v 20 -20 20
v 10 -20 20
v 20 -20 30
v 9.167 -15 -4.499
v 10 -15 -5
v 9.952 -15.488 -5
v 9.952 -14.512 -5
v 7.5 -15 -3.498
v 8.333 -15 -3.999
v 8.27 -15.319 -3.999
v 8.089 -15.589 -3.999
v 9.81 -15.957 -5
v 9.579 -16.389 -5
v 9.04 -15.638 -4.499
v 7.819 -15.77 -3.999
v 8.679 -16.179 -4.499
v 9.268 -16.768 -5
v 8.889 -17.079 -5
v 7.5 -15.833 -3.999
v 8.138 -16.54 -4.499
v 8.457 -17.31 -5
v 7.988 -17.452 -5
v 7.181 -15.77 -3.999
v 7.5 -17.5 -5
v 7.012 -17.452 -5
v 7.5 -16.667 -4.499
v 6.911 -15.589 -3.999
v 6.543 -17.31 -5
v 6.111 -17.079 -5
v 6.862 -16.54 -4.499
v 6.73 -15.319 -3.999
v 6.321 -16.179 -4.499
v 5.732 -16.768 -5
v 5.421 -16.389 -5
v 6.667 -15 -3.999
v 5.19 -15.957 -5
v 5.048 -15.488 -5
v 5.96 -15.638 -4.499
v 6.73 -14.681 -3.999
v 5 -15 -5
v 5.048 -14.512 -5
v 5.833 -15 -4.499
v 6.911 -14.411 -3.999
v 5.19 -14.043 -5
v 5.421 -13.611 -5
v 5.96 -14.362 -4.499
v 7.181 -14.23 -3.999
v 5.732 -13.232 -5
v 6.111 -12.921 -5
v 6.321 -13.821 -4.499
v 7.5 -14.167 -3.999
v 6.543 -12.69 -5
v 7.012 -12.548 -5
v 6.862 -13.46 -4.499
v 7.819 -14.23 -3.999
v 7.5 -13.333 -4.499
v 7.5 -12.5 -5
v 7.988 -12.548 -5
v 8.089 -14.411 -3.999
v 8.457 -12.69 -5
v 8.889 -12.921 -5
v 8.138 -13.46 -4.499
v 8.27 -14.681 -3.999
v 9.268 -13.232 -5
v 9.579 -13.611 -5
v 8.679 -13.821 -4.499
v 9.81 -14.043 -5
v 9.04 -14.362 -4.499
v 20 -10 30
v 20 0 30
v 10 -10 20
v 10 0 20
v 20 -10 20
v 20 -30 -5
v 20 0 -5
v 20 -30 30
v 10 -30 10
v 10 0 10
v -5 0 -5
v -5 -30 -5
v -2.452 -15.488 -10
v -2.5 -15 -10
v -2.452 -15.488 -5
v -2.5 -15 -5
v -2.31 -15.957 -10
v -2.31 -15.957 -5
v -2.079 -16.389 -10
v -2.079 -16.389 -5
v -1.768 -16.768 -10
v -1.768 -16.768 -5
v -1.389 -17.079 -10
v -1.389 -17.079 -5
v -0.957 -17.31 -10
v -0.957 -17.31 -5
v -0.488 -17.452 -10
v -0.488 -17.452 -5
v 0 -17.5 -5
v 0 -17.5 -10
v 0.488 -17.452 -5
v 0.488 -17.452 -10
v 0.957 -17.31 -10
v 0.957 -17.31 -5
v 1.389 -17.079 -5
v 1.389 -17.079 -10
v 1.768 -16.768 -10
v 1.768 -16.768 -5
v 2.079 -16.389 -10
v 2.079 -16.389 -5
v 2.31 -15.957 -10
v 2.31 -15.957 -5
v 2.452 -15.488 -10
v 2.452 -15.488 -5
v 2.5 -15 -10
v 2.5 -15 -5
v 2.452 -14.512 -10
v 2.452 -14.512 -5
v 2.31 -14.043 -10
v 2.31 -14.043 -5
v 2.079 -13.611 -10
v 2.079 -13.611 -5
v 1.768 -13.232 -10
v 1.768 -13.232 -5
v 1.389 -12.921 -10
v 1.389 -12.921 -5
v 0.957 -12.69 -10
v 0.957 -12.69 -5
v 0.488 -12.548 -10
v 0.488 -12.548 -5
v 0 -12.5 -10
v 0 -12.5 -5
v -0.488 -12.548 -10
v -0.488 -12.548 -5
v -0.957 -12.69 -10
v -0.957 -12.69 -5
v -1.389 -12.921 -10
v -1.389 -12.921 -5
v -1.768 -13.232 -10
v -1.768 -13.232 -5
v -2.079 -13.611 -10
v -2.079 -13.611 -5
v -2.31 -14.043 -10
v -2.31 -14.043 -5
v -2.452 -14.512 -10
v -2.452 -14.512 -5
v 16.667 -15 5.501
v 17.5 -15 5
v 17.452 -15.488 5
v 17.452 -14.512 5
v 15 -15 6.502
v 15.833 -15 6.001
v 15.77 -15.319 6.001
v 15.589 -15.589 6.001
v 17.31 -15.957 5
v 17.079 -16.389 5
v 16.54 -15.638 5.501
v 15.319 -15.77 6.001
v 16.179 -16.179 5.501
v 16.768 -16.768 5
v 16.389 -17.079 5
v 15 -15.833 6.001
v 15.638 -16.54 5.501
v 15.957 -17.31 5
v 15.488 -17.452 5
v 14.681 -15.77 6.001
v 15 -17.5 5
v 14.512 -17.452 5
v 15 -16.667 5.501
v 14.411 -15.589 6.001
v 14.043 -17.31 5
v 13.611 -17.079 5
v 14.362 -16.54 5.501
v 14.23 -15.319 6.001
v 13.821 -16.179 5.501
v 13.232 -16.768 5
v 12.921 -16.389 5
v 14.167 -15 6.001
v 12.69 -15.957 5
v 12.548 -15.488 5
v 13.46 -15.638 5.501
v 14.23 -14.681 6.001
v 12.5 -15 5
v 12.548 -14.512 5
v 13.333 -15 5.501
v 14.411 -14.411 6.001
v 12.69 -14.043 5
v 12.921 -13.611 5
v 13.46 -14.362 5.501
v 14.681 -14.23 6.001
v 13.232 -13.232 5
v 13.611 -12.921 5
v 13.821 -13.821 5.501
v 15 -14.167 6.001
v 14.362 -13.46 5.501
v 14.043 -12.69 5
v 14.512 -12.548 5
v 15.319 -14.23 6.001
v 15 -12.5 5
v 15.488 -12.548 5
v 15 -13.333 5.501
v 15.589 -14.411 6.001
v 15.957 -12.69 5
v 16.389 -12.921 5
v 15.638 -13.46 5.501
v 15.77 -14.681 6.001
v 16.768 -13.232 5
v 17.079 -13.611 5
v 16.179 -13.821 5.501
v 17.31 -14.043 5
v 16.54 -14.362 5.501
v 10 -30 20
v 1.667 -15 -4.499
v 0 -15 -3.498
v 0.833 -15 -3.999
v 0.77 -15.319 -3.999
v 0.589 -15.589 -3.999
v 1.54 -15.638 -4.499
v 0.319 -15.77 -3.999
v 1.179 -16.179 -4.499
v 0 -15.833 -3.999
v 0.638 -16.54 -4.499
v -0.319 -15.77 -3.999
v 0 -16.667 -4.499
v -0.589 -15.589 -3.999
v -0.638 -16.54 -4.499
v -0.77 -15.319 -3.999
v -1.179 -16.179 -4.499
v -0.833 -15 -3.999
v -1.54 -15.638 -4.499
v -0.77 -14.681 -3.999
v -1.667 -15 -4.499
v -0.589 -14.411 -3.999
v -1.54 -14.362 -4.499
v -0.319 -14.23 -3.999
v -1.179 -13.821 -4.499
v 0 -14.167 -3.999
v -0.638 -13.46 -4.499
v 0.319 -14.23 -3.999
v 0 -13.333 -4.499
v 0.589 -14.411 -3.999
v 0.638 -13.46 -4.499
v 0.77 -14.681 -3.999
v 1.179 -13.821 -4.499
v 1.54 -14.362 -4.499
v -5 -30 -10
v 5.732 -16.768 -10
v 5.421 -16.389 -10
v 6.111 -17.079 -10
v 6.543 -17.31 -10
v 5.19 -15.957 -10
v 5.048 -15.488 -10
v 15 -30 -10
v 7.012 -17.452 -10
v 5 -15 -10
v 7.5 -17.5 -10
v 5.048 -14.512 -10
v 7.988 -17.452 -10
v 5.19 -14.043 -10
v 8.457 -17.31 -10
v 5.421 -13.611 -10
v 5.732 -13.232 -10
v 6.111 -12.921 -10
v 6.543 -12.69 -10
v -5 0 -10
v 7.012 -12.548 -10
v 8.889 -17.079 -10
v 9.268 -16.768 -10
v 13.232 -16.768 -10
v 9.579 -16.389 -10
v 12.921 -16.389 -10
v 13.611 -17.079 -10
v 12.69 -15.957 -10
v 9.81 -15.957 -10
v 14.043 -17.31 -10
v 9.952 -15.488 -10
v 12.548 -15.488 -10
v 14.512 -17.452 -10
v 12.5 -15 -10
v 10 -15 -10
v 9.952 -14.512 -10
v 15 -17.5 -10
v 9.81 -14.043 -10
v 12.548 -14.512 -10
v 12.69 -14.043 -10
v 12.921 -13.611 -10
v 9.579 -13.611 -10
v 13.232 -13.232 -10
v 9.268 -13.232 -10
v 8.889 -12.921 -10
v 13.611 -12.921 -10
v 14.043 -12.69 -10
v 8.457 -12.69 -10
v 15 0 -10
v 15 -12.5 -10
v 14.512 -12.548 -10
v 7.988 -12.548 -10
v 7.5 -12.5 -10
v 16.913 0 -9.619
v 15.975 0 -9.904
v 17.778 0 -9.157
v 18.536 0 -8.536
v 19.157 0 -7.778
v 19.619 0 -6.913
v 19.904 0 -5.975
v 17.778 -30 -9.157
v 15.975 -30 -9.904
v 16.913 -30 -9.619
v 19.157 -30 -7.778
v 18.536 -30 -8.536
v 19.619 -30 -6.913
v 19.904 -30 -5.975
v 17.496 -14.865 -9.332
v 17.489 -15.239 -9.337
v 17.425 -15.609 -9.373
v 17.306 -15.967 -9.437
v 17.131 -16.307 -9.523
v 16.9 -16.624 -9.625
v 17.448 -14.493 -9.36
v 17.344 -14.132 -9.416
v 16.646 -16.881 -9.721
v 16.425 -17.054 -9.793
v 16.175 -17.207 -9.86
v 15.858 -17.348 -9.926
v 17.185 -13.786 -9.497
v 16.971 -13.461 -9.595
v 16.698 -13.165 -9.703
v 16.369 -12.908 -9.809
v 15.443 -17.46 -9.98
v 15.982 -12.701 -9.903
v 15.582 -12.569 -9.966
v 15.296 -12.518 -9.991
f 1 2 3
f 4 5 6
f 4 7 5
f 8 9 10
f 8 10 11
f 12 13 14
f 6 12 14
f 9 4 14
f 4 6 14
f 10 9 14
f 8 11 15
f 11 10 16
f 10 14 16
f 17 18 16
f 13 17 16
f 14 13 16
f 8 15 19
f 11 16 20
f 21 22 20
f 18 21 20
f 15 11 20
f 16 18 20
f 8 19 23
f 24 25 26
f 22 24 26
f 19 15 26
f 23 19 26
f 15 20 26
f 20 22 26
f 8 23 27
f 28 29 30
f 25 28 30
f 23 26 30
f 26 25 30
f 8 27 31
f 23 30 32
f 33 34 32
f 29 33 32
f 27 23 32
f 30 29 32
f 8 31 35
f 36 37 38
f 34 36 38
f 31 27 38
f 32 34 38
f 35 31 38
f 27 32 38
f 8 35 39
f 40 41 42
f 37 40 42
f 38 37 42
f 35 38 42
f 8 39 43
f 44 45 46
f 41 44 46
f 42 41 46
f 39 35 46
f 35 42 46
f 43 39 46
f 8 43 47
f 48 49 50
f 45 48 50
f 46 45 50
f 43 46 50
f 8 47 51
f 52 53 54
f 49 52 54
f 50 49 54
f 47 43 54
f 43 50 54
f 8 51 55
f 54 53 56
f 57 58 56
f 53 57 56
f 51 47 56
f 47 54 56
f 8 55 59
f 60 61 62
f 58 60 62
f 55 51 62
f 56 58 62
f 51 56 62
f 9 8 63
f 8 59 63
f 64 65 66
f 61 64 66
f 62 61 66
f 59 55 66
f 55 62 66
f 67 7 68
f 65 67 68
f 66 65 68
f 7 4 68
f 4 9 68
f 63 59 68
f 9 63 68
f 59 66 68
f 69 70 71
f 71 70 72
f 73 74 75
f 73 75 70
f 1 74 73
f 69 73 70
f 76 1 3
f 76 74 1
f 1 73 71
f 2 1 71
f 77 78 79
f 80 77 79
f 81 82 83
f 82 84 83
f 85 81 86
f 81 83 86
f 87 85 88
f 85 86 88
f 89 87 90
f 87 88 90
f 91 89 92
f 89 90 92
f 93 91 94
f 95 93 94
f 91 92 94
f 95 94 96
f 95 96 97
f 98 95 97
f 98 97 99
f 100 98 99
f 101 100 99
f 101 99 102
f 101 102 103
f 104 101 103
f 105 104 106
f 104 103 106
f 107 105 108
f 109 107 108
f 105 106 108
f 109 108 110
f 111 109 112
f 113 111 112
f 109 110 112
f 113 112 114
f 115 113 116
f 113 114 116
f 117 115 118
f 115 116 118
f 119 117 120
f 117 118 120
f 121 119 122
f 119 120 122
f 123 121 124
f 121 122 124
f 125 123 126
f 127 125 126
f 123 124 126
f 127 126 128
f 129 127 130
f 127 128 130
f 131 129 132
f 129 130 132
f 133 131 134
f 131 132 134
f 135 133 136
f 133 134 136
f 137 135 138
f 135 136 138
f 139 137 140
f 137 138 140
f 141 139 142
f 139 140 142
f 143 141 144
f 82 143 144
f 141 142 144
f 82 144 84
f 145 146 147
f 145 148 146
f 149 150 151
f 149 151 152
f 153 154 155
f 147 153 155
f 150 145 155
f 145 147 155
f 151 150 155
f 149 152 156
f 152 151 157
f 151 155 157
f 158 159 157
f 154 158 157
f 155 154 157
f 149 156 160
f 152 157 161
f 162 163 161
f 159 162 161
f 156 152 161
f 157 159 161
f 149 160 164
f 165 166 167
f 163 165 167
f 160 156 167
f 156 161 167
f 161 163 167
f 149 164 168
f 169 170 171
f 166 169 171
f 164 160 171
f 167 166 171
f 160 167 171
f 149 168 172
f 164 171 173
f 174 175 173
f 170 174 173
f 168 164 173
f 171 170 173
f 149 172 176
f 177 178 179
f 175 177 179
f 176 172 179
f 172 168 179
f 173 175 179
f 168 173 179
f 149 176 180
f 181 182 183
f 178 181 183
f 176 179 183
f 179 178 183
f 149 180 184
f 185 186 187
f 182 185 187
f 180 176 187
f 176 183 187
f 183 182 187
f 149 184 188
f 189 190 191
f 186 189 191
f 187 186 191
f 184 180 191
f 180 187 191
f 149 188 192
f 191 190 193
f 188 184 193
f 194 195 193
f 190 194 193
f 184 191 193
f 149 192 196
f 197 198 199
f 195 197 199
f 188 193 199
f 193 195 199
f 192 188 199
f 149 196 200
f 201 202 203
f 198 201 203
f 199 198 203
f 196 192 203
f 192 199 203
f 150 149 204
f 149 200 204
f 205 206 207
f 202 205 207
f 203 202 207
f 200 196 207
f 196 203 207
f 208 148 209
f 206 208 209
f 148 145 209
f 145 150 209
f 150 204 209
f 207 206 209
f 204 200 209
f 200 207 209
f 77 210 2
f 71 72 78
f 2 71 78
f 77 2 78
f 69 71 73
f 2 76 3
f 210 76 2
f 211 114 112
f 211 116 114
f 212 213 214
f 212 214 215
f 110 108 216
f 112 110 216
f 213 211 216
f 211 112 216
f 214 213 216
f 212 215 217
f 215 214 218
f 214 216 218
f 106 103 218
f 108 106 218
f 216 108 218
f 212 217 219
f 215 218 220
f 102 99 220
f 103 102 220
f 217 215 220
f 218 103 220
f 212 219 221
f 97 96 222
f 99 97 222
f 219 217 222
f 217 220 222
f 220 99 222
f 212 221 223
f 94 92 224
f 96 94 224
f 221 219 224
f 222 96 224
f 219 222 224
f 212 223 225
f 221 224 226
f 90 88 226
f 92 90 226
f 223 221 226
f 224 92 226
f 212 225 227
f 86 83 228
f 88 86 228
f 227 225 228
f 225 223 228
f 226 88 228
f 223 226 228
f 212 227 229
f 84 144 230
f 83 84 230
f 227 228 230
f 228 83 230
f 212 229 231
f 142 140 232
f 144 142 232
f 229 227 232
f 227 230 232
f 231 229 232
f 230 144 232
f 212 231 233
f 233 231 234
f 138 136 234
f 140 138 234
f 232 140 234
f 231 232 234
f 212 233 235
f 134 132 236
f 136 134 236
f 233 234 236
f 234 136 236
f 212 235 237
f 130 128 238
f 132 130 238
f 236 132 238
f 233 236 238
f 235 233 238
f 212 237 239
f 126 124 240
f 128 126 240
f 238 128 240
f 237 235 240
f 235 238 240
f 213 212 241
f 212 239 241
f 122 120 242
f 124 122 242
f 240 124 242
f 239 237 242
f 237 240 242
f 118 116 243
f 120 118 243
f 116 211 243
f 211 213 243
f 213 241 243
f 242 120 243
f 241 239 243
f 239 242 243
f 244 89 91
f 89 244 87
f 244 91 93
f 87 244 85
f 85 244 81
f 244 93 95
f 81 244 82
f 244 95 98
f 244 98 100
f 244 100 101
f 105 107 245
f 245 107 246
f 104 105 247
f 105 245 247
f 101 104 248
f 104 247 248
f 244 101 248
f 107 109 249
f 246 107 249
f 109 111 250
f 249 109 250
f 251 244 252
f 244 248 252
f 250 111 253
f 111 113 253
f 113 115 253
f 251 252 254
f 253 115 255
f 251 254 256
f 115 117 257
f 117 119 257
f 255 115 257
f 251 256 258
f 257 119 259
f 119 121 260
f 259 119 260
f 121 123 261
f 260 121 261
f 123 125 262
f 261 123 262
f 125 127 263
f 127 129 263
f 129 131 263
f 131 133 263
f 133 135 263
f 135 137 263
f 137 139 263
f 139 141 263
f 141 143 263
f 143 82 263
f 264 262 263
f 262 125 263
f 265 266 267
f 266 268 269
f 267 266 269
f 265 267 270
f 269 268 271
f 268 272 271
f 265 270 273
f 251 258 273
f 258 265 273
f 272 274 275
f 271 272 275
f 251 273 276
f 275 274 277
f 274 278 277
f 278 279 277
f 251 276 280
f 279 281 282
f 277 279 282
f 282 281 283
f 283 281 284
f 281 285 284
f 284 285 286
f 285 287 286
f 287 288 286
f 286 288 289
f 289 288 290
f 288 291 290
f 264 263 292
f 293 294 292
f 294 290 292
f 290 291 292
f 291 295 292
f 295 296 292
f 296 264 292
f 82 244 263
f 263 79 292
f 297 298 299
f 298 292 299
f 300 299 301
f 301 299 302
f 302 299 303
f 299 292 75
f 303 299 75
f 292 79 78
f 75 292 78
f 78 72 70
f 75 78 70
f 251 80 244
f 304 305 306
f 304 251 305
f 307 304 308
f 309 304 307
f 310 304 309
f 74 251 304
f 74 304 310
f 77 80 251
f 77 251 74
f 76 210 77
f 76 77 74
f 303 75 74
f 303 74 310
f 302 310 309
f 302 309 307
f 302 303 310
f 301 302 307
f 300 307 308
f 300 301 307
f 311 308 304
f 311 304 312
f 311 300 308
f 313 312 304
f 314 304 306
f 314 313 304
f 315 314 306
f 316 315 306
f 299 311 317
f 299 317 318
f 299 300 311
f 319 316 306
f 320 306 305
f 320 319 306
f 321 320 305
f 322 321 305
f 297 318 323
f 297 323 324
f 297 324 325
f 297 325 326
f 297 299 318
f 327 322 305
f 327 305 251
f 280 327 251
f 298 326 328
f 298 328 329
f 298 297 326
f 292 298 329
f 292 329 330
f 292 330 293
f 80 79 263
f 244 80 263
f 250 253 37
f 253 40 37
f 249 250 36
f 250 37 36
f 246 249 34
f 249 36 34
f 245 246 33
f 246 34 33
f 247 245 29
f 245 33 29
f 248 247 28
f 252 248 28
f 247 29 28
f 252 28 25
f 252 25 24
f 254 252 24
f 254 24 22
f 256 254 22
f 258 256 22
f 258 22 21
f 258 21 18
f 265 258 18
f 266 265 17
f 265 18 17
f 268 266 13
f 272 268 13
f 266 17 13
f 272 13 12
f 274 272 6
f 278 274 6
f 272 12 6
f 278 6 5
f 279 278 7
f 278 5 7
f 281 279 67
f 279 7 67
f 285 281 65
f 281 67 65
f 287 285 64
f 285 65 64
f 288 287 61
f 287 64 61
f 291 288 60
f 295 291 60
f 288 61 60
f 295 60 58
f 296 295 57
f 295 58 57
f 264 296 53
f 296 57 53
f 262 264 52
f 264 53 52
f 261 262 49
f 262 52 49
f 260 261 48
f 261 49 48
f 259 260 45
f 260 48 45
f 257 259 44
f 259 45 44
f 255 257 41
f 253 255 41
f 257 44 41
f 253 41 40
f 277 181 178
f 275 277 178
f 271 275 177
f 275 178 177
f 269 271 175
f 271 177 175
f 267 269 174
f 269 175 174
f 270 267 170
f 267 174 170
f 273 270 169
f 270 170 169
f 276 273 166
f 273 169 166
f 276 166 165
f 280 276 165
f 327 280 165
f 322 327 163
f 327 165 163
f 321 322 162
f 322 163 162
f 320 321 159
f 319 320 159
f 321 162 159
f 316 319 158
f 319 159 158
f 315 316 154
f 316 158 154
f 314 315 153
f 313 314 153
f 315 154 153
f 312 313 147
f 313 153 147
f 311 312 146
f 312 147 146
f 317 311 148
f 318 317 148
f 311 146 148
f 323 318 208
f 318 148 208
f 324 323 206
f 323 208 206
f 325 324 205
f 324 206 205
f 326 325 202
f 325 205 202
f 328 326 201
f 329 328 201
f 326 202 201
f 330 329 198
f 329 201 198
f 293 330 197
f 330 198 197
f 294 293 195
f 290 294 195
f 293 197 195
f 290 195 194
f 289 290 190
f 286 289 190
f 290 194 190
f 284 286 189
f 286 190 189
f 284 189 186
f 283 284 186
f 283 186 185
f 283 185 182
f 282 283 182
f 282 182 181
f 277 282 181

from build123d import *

# Parameters (mm, degrees)
F5_W        = 10
F5_H        = 10
F0_DEPTH    = 30
F1_DEPTH    = 10
F7_DEPTH    = 10
F3_D        = 5
F3_DEPTH    = 15
F3_TIP      = 1.5021515476
F8_D        = 5
F8_DEPTH    = 5
F8_TIP      = 1.5021515476
F4_T1_DEPTH = 55


# Not quite as in the source:
# - a fillet or chamfer that OpenCascade refuses, or shapes differently, is made with other operations: its cross-section is extruded or revolved along the edge and cut away or added


with BuildPart() as f0:
    # F5 (on Front) → F0 (new body)
    with BuildSketch(Plane.XZ):
        Polygon((10, 20), (10, 10), (20, 20), align=None)
        Polygon((20, 20), (10, 10), (20, 10), align=None)
        with Locations((15, 5)):
            Rectangle(F5_W, F5_H)
        Polygon((10, 10), (0, 0), (10, 0), align=None)
        Polygon((10, 0), (0, 0), (-5, -5), (-5, -10), (20, -10), (20, 0), align=None)
    extrude(amount=F0_DEPTH)

    # F5 (on Front) → F1 (join)
    with BuildSketch(Plane.XZ):
        Polygon((10, 20), (20, 20), (20, 30), align=None)
    extrude(amount=F1_DEPTH)

    # F6 (on face) → F7 (join)
    with BuildSketch(Plane.XZ.offset(30)):
        Polygon((10, 20), (20, 20), (20, 30), align=None)
    extrude(amount=-F7_DEPTH)

    # F3
    with Locations(Plane(origin=(0, 0, -10), x_dir=(1, 0, 0), z_dir=(0, 0, -1))):
        with Locations((15, 15)):
            Hole(F3_D / 2, depth=F3_DEPTH)
            with Locations((0, 0, -(F3_DEPTH + F3_TIP / 2))):  # 118° drill point
                Cone(0, F3_D / 2, F3_TIP, mode=Mode.SUBTRACT)

    # F8
    with Locations(Plane(origin=(0, 0, -10), x_dir=(1, 0, 0), z_dir=(0, 0, -1))):
        with Locations((7.5, 15), (0, 15)):
            Hole(F8_D / 2, depth=F8_DEPTH)
            with Locations((0, 0, -(F8_DEPTH + F8_TIP / 2))):  # 118° drill point
                Cone(0, F8_D / 2, F8_TIP, mode=Mode.SUBTRACT)

    # F4: fillet of radius 5 on 1 edges, made by hand

    # F4_s2 → F4_t1 (cut)
    with BuildSketch(Plane.XZ.offset(-12.5)):
        with BuildLine():
            ThreePointArc((20, -5), (18.5355339059, -8.5355339059), (15, -10))
            Line((15, -10), (20, -10))
            Line((20, -10), (20, -5))
        make_face()
    extrude(amount=F4_T1_DEPTH, mode=Mode.SUBTRACT)


solid = f0.part
